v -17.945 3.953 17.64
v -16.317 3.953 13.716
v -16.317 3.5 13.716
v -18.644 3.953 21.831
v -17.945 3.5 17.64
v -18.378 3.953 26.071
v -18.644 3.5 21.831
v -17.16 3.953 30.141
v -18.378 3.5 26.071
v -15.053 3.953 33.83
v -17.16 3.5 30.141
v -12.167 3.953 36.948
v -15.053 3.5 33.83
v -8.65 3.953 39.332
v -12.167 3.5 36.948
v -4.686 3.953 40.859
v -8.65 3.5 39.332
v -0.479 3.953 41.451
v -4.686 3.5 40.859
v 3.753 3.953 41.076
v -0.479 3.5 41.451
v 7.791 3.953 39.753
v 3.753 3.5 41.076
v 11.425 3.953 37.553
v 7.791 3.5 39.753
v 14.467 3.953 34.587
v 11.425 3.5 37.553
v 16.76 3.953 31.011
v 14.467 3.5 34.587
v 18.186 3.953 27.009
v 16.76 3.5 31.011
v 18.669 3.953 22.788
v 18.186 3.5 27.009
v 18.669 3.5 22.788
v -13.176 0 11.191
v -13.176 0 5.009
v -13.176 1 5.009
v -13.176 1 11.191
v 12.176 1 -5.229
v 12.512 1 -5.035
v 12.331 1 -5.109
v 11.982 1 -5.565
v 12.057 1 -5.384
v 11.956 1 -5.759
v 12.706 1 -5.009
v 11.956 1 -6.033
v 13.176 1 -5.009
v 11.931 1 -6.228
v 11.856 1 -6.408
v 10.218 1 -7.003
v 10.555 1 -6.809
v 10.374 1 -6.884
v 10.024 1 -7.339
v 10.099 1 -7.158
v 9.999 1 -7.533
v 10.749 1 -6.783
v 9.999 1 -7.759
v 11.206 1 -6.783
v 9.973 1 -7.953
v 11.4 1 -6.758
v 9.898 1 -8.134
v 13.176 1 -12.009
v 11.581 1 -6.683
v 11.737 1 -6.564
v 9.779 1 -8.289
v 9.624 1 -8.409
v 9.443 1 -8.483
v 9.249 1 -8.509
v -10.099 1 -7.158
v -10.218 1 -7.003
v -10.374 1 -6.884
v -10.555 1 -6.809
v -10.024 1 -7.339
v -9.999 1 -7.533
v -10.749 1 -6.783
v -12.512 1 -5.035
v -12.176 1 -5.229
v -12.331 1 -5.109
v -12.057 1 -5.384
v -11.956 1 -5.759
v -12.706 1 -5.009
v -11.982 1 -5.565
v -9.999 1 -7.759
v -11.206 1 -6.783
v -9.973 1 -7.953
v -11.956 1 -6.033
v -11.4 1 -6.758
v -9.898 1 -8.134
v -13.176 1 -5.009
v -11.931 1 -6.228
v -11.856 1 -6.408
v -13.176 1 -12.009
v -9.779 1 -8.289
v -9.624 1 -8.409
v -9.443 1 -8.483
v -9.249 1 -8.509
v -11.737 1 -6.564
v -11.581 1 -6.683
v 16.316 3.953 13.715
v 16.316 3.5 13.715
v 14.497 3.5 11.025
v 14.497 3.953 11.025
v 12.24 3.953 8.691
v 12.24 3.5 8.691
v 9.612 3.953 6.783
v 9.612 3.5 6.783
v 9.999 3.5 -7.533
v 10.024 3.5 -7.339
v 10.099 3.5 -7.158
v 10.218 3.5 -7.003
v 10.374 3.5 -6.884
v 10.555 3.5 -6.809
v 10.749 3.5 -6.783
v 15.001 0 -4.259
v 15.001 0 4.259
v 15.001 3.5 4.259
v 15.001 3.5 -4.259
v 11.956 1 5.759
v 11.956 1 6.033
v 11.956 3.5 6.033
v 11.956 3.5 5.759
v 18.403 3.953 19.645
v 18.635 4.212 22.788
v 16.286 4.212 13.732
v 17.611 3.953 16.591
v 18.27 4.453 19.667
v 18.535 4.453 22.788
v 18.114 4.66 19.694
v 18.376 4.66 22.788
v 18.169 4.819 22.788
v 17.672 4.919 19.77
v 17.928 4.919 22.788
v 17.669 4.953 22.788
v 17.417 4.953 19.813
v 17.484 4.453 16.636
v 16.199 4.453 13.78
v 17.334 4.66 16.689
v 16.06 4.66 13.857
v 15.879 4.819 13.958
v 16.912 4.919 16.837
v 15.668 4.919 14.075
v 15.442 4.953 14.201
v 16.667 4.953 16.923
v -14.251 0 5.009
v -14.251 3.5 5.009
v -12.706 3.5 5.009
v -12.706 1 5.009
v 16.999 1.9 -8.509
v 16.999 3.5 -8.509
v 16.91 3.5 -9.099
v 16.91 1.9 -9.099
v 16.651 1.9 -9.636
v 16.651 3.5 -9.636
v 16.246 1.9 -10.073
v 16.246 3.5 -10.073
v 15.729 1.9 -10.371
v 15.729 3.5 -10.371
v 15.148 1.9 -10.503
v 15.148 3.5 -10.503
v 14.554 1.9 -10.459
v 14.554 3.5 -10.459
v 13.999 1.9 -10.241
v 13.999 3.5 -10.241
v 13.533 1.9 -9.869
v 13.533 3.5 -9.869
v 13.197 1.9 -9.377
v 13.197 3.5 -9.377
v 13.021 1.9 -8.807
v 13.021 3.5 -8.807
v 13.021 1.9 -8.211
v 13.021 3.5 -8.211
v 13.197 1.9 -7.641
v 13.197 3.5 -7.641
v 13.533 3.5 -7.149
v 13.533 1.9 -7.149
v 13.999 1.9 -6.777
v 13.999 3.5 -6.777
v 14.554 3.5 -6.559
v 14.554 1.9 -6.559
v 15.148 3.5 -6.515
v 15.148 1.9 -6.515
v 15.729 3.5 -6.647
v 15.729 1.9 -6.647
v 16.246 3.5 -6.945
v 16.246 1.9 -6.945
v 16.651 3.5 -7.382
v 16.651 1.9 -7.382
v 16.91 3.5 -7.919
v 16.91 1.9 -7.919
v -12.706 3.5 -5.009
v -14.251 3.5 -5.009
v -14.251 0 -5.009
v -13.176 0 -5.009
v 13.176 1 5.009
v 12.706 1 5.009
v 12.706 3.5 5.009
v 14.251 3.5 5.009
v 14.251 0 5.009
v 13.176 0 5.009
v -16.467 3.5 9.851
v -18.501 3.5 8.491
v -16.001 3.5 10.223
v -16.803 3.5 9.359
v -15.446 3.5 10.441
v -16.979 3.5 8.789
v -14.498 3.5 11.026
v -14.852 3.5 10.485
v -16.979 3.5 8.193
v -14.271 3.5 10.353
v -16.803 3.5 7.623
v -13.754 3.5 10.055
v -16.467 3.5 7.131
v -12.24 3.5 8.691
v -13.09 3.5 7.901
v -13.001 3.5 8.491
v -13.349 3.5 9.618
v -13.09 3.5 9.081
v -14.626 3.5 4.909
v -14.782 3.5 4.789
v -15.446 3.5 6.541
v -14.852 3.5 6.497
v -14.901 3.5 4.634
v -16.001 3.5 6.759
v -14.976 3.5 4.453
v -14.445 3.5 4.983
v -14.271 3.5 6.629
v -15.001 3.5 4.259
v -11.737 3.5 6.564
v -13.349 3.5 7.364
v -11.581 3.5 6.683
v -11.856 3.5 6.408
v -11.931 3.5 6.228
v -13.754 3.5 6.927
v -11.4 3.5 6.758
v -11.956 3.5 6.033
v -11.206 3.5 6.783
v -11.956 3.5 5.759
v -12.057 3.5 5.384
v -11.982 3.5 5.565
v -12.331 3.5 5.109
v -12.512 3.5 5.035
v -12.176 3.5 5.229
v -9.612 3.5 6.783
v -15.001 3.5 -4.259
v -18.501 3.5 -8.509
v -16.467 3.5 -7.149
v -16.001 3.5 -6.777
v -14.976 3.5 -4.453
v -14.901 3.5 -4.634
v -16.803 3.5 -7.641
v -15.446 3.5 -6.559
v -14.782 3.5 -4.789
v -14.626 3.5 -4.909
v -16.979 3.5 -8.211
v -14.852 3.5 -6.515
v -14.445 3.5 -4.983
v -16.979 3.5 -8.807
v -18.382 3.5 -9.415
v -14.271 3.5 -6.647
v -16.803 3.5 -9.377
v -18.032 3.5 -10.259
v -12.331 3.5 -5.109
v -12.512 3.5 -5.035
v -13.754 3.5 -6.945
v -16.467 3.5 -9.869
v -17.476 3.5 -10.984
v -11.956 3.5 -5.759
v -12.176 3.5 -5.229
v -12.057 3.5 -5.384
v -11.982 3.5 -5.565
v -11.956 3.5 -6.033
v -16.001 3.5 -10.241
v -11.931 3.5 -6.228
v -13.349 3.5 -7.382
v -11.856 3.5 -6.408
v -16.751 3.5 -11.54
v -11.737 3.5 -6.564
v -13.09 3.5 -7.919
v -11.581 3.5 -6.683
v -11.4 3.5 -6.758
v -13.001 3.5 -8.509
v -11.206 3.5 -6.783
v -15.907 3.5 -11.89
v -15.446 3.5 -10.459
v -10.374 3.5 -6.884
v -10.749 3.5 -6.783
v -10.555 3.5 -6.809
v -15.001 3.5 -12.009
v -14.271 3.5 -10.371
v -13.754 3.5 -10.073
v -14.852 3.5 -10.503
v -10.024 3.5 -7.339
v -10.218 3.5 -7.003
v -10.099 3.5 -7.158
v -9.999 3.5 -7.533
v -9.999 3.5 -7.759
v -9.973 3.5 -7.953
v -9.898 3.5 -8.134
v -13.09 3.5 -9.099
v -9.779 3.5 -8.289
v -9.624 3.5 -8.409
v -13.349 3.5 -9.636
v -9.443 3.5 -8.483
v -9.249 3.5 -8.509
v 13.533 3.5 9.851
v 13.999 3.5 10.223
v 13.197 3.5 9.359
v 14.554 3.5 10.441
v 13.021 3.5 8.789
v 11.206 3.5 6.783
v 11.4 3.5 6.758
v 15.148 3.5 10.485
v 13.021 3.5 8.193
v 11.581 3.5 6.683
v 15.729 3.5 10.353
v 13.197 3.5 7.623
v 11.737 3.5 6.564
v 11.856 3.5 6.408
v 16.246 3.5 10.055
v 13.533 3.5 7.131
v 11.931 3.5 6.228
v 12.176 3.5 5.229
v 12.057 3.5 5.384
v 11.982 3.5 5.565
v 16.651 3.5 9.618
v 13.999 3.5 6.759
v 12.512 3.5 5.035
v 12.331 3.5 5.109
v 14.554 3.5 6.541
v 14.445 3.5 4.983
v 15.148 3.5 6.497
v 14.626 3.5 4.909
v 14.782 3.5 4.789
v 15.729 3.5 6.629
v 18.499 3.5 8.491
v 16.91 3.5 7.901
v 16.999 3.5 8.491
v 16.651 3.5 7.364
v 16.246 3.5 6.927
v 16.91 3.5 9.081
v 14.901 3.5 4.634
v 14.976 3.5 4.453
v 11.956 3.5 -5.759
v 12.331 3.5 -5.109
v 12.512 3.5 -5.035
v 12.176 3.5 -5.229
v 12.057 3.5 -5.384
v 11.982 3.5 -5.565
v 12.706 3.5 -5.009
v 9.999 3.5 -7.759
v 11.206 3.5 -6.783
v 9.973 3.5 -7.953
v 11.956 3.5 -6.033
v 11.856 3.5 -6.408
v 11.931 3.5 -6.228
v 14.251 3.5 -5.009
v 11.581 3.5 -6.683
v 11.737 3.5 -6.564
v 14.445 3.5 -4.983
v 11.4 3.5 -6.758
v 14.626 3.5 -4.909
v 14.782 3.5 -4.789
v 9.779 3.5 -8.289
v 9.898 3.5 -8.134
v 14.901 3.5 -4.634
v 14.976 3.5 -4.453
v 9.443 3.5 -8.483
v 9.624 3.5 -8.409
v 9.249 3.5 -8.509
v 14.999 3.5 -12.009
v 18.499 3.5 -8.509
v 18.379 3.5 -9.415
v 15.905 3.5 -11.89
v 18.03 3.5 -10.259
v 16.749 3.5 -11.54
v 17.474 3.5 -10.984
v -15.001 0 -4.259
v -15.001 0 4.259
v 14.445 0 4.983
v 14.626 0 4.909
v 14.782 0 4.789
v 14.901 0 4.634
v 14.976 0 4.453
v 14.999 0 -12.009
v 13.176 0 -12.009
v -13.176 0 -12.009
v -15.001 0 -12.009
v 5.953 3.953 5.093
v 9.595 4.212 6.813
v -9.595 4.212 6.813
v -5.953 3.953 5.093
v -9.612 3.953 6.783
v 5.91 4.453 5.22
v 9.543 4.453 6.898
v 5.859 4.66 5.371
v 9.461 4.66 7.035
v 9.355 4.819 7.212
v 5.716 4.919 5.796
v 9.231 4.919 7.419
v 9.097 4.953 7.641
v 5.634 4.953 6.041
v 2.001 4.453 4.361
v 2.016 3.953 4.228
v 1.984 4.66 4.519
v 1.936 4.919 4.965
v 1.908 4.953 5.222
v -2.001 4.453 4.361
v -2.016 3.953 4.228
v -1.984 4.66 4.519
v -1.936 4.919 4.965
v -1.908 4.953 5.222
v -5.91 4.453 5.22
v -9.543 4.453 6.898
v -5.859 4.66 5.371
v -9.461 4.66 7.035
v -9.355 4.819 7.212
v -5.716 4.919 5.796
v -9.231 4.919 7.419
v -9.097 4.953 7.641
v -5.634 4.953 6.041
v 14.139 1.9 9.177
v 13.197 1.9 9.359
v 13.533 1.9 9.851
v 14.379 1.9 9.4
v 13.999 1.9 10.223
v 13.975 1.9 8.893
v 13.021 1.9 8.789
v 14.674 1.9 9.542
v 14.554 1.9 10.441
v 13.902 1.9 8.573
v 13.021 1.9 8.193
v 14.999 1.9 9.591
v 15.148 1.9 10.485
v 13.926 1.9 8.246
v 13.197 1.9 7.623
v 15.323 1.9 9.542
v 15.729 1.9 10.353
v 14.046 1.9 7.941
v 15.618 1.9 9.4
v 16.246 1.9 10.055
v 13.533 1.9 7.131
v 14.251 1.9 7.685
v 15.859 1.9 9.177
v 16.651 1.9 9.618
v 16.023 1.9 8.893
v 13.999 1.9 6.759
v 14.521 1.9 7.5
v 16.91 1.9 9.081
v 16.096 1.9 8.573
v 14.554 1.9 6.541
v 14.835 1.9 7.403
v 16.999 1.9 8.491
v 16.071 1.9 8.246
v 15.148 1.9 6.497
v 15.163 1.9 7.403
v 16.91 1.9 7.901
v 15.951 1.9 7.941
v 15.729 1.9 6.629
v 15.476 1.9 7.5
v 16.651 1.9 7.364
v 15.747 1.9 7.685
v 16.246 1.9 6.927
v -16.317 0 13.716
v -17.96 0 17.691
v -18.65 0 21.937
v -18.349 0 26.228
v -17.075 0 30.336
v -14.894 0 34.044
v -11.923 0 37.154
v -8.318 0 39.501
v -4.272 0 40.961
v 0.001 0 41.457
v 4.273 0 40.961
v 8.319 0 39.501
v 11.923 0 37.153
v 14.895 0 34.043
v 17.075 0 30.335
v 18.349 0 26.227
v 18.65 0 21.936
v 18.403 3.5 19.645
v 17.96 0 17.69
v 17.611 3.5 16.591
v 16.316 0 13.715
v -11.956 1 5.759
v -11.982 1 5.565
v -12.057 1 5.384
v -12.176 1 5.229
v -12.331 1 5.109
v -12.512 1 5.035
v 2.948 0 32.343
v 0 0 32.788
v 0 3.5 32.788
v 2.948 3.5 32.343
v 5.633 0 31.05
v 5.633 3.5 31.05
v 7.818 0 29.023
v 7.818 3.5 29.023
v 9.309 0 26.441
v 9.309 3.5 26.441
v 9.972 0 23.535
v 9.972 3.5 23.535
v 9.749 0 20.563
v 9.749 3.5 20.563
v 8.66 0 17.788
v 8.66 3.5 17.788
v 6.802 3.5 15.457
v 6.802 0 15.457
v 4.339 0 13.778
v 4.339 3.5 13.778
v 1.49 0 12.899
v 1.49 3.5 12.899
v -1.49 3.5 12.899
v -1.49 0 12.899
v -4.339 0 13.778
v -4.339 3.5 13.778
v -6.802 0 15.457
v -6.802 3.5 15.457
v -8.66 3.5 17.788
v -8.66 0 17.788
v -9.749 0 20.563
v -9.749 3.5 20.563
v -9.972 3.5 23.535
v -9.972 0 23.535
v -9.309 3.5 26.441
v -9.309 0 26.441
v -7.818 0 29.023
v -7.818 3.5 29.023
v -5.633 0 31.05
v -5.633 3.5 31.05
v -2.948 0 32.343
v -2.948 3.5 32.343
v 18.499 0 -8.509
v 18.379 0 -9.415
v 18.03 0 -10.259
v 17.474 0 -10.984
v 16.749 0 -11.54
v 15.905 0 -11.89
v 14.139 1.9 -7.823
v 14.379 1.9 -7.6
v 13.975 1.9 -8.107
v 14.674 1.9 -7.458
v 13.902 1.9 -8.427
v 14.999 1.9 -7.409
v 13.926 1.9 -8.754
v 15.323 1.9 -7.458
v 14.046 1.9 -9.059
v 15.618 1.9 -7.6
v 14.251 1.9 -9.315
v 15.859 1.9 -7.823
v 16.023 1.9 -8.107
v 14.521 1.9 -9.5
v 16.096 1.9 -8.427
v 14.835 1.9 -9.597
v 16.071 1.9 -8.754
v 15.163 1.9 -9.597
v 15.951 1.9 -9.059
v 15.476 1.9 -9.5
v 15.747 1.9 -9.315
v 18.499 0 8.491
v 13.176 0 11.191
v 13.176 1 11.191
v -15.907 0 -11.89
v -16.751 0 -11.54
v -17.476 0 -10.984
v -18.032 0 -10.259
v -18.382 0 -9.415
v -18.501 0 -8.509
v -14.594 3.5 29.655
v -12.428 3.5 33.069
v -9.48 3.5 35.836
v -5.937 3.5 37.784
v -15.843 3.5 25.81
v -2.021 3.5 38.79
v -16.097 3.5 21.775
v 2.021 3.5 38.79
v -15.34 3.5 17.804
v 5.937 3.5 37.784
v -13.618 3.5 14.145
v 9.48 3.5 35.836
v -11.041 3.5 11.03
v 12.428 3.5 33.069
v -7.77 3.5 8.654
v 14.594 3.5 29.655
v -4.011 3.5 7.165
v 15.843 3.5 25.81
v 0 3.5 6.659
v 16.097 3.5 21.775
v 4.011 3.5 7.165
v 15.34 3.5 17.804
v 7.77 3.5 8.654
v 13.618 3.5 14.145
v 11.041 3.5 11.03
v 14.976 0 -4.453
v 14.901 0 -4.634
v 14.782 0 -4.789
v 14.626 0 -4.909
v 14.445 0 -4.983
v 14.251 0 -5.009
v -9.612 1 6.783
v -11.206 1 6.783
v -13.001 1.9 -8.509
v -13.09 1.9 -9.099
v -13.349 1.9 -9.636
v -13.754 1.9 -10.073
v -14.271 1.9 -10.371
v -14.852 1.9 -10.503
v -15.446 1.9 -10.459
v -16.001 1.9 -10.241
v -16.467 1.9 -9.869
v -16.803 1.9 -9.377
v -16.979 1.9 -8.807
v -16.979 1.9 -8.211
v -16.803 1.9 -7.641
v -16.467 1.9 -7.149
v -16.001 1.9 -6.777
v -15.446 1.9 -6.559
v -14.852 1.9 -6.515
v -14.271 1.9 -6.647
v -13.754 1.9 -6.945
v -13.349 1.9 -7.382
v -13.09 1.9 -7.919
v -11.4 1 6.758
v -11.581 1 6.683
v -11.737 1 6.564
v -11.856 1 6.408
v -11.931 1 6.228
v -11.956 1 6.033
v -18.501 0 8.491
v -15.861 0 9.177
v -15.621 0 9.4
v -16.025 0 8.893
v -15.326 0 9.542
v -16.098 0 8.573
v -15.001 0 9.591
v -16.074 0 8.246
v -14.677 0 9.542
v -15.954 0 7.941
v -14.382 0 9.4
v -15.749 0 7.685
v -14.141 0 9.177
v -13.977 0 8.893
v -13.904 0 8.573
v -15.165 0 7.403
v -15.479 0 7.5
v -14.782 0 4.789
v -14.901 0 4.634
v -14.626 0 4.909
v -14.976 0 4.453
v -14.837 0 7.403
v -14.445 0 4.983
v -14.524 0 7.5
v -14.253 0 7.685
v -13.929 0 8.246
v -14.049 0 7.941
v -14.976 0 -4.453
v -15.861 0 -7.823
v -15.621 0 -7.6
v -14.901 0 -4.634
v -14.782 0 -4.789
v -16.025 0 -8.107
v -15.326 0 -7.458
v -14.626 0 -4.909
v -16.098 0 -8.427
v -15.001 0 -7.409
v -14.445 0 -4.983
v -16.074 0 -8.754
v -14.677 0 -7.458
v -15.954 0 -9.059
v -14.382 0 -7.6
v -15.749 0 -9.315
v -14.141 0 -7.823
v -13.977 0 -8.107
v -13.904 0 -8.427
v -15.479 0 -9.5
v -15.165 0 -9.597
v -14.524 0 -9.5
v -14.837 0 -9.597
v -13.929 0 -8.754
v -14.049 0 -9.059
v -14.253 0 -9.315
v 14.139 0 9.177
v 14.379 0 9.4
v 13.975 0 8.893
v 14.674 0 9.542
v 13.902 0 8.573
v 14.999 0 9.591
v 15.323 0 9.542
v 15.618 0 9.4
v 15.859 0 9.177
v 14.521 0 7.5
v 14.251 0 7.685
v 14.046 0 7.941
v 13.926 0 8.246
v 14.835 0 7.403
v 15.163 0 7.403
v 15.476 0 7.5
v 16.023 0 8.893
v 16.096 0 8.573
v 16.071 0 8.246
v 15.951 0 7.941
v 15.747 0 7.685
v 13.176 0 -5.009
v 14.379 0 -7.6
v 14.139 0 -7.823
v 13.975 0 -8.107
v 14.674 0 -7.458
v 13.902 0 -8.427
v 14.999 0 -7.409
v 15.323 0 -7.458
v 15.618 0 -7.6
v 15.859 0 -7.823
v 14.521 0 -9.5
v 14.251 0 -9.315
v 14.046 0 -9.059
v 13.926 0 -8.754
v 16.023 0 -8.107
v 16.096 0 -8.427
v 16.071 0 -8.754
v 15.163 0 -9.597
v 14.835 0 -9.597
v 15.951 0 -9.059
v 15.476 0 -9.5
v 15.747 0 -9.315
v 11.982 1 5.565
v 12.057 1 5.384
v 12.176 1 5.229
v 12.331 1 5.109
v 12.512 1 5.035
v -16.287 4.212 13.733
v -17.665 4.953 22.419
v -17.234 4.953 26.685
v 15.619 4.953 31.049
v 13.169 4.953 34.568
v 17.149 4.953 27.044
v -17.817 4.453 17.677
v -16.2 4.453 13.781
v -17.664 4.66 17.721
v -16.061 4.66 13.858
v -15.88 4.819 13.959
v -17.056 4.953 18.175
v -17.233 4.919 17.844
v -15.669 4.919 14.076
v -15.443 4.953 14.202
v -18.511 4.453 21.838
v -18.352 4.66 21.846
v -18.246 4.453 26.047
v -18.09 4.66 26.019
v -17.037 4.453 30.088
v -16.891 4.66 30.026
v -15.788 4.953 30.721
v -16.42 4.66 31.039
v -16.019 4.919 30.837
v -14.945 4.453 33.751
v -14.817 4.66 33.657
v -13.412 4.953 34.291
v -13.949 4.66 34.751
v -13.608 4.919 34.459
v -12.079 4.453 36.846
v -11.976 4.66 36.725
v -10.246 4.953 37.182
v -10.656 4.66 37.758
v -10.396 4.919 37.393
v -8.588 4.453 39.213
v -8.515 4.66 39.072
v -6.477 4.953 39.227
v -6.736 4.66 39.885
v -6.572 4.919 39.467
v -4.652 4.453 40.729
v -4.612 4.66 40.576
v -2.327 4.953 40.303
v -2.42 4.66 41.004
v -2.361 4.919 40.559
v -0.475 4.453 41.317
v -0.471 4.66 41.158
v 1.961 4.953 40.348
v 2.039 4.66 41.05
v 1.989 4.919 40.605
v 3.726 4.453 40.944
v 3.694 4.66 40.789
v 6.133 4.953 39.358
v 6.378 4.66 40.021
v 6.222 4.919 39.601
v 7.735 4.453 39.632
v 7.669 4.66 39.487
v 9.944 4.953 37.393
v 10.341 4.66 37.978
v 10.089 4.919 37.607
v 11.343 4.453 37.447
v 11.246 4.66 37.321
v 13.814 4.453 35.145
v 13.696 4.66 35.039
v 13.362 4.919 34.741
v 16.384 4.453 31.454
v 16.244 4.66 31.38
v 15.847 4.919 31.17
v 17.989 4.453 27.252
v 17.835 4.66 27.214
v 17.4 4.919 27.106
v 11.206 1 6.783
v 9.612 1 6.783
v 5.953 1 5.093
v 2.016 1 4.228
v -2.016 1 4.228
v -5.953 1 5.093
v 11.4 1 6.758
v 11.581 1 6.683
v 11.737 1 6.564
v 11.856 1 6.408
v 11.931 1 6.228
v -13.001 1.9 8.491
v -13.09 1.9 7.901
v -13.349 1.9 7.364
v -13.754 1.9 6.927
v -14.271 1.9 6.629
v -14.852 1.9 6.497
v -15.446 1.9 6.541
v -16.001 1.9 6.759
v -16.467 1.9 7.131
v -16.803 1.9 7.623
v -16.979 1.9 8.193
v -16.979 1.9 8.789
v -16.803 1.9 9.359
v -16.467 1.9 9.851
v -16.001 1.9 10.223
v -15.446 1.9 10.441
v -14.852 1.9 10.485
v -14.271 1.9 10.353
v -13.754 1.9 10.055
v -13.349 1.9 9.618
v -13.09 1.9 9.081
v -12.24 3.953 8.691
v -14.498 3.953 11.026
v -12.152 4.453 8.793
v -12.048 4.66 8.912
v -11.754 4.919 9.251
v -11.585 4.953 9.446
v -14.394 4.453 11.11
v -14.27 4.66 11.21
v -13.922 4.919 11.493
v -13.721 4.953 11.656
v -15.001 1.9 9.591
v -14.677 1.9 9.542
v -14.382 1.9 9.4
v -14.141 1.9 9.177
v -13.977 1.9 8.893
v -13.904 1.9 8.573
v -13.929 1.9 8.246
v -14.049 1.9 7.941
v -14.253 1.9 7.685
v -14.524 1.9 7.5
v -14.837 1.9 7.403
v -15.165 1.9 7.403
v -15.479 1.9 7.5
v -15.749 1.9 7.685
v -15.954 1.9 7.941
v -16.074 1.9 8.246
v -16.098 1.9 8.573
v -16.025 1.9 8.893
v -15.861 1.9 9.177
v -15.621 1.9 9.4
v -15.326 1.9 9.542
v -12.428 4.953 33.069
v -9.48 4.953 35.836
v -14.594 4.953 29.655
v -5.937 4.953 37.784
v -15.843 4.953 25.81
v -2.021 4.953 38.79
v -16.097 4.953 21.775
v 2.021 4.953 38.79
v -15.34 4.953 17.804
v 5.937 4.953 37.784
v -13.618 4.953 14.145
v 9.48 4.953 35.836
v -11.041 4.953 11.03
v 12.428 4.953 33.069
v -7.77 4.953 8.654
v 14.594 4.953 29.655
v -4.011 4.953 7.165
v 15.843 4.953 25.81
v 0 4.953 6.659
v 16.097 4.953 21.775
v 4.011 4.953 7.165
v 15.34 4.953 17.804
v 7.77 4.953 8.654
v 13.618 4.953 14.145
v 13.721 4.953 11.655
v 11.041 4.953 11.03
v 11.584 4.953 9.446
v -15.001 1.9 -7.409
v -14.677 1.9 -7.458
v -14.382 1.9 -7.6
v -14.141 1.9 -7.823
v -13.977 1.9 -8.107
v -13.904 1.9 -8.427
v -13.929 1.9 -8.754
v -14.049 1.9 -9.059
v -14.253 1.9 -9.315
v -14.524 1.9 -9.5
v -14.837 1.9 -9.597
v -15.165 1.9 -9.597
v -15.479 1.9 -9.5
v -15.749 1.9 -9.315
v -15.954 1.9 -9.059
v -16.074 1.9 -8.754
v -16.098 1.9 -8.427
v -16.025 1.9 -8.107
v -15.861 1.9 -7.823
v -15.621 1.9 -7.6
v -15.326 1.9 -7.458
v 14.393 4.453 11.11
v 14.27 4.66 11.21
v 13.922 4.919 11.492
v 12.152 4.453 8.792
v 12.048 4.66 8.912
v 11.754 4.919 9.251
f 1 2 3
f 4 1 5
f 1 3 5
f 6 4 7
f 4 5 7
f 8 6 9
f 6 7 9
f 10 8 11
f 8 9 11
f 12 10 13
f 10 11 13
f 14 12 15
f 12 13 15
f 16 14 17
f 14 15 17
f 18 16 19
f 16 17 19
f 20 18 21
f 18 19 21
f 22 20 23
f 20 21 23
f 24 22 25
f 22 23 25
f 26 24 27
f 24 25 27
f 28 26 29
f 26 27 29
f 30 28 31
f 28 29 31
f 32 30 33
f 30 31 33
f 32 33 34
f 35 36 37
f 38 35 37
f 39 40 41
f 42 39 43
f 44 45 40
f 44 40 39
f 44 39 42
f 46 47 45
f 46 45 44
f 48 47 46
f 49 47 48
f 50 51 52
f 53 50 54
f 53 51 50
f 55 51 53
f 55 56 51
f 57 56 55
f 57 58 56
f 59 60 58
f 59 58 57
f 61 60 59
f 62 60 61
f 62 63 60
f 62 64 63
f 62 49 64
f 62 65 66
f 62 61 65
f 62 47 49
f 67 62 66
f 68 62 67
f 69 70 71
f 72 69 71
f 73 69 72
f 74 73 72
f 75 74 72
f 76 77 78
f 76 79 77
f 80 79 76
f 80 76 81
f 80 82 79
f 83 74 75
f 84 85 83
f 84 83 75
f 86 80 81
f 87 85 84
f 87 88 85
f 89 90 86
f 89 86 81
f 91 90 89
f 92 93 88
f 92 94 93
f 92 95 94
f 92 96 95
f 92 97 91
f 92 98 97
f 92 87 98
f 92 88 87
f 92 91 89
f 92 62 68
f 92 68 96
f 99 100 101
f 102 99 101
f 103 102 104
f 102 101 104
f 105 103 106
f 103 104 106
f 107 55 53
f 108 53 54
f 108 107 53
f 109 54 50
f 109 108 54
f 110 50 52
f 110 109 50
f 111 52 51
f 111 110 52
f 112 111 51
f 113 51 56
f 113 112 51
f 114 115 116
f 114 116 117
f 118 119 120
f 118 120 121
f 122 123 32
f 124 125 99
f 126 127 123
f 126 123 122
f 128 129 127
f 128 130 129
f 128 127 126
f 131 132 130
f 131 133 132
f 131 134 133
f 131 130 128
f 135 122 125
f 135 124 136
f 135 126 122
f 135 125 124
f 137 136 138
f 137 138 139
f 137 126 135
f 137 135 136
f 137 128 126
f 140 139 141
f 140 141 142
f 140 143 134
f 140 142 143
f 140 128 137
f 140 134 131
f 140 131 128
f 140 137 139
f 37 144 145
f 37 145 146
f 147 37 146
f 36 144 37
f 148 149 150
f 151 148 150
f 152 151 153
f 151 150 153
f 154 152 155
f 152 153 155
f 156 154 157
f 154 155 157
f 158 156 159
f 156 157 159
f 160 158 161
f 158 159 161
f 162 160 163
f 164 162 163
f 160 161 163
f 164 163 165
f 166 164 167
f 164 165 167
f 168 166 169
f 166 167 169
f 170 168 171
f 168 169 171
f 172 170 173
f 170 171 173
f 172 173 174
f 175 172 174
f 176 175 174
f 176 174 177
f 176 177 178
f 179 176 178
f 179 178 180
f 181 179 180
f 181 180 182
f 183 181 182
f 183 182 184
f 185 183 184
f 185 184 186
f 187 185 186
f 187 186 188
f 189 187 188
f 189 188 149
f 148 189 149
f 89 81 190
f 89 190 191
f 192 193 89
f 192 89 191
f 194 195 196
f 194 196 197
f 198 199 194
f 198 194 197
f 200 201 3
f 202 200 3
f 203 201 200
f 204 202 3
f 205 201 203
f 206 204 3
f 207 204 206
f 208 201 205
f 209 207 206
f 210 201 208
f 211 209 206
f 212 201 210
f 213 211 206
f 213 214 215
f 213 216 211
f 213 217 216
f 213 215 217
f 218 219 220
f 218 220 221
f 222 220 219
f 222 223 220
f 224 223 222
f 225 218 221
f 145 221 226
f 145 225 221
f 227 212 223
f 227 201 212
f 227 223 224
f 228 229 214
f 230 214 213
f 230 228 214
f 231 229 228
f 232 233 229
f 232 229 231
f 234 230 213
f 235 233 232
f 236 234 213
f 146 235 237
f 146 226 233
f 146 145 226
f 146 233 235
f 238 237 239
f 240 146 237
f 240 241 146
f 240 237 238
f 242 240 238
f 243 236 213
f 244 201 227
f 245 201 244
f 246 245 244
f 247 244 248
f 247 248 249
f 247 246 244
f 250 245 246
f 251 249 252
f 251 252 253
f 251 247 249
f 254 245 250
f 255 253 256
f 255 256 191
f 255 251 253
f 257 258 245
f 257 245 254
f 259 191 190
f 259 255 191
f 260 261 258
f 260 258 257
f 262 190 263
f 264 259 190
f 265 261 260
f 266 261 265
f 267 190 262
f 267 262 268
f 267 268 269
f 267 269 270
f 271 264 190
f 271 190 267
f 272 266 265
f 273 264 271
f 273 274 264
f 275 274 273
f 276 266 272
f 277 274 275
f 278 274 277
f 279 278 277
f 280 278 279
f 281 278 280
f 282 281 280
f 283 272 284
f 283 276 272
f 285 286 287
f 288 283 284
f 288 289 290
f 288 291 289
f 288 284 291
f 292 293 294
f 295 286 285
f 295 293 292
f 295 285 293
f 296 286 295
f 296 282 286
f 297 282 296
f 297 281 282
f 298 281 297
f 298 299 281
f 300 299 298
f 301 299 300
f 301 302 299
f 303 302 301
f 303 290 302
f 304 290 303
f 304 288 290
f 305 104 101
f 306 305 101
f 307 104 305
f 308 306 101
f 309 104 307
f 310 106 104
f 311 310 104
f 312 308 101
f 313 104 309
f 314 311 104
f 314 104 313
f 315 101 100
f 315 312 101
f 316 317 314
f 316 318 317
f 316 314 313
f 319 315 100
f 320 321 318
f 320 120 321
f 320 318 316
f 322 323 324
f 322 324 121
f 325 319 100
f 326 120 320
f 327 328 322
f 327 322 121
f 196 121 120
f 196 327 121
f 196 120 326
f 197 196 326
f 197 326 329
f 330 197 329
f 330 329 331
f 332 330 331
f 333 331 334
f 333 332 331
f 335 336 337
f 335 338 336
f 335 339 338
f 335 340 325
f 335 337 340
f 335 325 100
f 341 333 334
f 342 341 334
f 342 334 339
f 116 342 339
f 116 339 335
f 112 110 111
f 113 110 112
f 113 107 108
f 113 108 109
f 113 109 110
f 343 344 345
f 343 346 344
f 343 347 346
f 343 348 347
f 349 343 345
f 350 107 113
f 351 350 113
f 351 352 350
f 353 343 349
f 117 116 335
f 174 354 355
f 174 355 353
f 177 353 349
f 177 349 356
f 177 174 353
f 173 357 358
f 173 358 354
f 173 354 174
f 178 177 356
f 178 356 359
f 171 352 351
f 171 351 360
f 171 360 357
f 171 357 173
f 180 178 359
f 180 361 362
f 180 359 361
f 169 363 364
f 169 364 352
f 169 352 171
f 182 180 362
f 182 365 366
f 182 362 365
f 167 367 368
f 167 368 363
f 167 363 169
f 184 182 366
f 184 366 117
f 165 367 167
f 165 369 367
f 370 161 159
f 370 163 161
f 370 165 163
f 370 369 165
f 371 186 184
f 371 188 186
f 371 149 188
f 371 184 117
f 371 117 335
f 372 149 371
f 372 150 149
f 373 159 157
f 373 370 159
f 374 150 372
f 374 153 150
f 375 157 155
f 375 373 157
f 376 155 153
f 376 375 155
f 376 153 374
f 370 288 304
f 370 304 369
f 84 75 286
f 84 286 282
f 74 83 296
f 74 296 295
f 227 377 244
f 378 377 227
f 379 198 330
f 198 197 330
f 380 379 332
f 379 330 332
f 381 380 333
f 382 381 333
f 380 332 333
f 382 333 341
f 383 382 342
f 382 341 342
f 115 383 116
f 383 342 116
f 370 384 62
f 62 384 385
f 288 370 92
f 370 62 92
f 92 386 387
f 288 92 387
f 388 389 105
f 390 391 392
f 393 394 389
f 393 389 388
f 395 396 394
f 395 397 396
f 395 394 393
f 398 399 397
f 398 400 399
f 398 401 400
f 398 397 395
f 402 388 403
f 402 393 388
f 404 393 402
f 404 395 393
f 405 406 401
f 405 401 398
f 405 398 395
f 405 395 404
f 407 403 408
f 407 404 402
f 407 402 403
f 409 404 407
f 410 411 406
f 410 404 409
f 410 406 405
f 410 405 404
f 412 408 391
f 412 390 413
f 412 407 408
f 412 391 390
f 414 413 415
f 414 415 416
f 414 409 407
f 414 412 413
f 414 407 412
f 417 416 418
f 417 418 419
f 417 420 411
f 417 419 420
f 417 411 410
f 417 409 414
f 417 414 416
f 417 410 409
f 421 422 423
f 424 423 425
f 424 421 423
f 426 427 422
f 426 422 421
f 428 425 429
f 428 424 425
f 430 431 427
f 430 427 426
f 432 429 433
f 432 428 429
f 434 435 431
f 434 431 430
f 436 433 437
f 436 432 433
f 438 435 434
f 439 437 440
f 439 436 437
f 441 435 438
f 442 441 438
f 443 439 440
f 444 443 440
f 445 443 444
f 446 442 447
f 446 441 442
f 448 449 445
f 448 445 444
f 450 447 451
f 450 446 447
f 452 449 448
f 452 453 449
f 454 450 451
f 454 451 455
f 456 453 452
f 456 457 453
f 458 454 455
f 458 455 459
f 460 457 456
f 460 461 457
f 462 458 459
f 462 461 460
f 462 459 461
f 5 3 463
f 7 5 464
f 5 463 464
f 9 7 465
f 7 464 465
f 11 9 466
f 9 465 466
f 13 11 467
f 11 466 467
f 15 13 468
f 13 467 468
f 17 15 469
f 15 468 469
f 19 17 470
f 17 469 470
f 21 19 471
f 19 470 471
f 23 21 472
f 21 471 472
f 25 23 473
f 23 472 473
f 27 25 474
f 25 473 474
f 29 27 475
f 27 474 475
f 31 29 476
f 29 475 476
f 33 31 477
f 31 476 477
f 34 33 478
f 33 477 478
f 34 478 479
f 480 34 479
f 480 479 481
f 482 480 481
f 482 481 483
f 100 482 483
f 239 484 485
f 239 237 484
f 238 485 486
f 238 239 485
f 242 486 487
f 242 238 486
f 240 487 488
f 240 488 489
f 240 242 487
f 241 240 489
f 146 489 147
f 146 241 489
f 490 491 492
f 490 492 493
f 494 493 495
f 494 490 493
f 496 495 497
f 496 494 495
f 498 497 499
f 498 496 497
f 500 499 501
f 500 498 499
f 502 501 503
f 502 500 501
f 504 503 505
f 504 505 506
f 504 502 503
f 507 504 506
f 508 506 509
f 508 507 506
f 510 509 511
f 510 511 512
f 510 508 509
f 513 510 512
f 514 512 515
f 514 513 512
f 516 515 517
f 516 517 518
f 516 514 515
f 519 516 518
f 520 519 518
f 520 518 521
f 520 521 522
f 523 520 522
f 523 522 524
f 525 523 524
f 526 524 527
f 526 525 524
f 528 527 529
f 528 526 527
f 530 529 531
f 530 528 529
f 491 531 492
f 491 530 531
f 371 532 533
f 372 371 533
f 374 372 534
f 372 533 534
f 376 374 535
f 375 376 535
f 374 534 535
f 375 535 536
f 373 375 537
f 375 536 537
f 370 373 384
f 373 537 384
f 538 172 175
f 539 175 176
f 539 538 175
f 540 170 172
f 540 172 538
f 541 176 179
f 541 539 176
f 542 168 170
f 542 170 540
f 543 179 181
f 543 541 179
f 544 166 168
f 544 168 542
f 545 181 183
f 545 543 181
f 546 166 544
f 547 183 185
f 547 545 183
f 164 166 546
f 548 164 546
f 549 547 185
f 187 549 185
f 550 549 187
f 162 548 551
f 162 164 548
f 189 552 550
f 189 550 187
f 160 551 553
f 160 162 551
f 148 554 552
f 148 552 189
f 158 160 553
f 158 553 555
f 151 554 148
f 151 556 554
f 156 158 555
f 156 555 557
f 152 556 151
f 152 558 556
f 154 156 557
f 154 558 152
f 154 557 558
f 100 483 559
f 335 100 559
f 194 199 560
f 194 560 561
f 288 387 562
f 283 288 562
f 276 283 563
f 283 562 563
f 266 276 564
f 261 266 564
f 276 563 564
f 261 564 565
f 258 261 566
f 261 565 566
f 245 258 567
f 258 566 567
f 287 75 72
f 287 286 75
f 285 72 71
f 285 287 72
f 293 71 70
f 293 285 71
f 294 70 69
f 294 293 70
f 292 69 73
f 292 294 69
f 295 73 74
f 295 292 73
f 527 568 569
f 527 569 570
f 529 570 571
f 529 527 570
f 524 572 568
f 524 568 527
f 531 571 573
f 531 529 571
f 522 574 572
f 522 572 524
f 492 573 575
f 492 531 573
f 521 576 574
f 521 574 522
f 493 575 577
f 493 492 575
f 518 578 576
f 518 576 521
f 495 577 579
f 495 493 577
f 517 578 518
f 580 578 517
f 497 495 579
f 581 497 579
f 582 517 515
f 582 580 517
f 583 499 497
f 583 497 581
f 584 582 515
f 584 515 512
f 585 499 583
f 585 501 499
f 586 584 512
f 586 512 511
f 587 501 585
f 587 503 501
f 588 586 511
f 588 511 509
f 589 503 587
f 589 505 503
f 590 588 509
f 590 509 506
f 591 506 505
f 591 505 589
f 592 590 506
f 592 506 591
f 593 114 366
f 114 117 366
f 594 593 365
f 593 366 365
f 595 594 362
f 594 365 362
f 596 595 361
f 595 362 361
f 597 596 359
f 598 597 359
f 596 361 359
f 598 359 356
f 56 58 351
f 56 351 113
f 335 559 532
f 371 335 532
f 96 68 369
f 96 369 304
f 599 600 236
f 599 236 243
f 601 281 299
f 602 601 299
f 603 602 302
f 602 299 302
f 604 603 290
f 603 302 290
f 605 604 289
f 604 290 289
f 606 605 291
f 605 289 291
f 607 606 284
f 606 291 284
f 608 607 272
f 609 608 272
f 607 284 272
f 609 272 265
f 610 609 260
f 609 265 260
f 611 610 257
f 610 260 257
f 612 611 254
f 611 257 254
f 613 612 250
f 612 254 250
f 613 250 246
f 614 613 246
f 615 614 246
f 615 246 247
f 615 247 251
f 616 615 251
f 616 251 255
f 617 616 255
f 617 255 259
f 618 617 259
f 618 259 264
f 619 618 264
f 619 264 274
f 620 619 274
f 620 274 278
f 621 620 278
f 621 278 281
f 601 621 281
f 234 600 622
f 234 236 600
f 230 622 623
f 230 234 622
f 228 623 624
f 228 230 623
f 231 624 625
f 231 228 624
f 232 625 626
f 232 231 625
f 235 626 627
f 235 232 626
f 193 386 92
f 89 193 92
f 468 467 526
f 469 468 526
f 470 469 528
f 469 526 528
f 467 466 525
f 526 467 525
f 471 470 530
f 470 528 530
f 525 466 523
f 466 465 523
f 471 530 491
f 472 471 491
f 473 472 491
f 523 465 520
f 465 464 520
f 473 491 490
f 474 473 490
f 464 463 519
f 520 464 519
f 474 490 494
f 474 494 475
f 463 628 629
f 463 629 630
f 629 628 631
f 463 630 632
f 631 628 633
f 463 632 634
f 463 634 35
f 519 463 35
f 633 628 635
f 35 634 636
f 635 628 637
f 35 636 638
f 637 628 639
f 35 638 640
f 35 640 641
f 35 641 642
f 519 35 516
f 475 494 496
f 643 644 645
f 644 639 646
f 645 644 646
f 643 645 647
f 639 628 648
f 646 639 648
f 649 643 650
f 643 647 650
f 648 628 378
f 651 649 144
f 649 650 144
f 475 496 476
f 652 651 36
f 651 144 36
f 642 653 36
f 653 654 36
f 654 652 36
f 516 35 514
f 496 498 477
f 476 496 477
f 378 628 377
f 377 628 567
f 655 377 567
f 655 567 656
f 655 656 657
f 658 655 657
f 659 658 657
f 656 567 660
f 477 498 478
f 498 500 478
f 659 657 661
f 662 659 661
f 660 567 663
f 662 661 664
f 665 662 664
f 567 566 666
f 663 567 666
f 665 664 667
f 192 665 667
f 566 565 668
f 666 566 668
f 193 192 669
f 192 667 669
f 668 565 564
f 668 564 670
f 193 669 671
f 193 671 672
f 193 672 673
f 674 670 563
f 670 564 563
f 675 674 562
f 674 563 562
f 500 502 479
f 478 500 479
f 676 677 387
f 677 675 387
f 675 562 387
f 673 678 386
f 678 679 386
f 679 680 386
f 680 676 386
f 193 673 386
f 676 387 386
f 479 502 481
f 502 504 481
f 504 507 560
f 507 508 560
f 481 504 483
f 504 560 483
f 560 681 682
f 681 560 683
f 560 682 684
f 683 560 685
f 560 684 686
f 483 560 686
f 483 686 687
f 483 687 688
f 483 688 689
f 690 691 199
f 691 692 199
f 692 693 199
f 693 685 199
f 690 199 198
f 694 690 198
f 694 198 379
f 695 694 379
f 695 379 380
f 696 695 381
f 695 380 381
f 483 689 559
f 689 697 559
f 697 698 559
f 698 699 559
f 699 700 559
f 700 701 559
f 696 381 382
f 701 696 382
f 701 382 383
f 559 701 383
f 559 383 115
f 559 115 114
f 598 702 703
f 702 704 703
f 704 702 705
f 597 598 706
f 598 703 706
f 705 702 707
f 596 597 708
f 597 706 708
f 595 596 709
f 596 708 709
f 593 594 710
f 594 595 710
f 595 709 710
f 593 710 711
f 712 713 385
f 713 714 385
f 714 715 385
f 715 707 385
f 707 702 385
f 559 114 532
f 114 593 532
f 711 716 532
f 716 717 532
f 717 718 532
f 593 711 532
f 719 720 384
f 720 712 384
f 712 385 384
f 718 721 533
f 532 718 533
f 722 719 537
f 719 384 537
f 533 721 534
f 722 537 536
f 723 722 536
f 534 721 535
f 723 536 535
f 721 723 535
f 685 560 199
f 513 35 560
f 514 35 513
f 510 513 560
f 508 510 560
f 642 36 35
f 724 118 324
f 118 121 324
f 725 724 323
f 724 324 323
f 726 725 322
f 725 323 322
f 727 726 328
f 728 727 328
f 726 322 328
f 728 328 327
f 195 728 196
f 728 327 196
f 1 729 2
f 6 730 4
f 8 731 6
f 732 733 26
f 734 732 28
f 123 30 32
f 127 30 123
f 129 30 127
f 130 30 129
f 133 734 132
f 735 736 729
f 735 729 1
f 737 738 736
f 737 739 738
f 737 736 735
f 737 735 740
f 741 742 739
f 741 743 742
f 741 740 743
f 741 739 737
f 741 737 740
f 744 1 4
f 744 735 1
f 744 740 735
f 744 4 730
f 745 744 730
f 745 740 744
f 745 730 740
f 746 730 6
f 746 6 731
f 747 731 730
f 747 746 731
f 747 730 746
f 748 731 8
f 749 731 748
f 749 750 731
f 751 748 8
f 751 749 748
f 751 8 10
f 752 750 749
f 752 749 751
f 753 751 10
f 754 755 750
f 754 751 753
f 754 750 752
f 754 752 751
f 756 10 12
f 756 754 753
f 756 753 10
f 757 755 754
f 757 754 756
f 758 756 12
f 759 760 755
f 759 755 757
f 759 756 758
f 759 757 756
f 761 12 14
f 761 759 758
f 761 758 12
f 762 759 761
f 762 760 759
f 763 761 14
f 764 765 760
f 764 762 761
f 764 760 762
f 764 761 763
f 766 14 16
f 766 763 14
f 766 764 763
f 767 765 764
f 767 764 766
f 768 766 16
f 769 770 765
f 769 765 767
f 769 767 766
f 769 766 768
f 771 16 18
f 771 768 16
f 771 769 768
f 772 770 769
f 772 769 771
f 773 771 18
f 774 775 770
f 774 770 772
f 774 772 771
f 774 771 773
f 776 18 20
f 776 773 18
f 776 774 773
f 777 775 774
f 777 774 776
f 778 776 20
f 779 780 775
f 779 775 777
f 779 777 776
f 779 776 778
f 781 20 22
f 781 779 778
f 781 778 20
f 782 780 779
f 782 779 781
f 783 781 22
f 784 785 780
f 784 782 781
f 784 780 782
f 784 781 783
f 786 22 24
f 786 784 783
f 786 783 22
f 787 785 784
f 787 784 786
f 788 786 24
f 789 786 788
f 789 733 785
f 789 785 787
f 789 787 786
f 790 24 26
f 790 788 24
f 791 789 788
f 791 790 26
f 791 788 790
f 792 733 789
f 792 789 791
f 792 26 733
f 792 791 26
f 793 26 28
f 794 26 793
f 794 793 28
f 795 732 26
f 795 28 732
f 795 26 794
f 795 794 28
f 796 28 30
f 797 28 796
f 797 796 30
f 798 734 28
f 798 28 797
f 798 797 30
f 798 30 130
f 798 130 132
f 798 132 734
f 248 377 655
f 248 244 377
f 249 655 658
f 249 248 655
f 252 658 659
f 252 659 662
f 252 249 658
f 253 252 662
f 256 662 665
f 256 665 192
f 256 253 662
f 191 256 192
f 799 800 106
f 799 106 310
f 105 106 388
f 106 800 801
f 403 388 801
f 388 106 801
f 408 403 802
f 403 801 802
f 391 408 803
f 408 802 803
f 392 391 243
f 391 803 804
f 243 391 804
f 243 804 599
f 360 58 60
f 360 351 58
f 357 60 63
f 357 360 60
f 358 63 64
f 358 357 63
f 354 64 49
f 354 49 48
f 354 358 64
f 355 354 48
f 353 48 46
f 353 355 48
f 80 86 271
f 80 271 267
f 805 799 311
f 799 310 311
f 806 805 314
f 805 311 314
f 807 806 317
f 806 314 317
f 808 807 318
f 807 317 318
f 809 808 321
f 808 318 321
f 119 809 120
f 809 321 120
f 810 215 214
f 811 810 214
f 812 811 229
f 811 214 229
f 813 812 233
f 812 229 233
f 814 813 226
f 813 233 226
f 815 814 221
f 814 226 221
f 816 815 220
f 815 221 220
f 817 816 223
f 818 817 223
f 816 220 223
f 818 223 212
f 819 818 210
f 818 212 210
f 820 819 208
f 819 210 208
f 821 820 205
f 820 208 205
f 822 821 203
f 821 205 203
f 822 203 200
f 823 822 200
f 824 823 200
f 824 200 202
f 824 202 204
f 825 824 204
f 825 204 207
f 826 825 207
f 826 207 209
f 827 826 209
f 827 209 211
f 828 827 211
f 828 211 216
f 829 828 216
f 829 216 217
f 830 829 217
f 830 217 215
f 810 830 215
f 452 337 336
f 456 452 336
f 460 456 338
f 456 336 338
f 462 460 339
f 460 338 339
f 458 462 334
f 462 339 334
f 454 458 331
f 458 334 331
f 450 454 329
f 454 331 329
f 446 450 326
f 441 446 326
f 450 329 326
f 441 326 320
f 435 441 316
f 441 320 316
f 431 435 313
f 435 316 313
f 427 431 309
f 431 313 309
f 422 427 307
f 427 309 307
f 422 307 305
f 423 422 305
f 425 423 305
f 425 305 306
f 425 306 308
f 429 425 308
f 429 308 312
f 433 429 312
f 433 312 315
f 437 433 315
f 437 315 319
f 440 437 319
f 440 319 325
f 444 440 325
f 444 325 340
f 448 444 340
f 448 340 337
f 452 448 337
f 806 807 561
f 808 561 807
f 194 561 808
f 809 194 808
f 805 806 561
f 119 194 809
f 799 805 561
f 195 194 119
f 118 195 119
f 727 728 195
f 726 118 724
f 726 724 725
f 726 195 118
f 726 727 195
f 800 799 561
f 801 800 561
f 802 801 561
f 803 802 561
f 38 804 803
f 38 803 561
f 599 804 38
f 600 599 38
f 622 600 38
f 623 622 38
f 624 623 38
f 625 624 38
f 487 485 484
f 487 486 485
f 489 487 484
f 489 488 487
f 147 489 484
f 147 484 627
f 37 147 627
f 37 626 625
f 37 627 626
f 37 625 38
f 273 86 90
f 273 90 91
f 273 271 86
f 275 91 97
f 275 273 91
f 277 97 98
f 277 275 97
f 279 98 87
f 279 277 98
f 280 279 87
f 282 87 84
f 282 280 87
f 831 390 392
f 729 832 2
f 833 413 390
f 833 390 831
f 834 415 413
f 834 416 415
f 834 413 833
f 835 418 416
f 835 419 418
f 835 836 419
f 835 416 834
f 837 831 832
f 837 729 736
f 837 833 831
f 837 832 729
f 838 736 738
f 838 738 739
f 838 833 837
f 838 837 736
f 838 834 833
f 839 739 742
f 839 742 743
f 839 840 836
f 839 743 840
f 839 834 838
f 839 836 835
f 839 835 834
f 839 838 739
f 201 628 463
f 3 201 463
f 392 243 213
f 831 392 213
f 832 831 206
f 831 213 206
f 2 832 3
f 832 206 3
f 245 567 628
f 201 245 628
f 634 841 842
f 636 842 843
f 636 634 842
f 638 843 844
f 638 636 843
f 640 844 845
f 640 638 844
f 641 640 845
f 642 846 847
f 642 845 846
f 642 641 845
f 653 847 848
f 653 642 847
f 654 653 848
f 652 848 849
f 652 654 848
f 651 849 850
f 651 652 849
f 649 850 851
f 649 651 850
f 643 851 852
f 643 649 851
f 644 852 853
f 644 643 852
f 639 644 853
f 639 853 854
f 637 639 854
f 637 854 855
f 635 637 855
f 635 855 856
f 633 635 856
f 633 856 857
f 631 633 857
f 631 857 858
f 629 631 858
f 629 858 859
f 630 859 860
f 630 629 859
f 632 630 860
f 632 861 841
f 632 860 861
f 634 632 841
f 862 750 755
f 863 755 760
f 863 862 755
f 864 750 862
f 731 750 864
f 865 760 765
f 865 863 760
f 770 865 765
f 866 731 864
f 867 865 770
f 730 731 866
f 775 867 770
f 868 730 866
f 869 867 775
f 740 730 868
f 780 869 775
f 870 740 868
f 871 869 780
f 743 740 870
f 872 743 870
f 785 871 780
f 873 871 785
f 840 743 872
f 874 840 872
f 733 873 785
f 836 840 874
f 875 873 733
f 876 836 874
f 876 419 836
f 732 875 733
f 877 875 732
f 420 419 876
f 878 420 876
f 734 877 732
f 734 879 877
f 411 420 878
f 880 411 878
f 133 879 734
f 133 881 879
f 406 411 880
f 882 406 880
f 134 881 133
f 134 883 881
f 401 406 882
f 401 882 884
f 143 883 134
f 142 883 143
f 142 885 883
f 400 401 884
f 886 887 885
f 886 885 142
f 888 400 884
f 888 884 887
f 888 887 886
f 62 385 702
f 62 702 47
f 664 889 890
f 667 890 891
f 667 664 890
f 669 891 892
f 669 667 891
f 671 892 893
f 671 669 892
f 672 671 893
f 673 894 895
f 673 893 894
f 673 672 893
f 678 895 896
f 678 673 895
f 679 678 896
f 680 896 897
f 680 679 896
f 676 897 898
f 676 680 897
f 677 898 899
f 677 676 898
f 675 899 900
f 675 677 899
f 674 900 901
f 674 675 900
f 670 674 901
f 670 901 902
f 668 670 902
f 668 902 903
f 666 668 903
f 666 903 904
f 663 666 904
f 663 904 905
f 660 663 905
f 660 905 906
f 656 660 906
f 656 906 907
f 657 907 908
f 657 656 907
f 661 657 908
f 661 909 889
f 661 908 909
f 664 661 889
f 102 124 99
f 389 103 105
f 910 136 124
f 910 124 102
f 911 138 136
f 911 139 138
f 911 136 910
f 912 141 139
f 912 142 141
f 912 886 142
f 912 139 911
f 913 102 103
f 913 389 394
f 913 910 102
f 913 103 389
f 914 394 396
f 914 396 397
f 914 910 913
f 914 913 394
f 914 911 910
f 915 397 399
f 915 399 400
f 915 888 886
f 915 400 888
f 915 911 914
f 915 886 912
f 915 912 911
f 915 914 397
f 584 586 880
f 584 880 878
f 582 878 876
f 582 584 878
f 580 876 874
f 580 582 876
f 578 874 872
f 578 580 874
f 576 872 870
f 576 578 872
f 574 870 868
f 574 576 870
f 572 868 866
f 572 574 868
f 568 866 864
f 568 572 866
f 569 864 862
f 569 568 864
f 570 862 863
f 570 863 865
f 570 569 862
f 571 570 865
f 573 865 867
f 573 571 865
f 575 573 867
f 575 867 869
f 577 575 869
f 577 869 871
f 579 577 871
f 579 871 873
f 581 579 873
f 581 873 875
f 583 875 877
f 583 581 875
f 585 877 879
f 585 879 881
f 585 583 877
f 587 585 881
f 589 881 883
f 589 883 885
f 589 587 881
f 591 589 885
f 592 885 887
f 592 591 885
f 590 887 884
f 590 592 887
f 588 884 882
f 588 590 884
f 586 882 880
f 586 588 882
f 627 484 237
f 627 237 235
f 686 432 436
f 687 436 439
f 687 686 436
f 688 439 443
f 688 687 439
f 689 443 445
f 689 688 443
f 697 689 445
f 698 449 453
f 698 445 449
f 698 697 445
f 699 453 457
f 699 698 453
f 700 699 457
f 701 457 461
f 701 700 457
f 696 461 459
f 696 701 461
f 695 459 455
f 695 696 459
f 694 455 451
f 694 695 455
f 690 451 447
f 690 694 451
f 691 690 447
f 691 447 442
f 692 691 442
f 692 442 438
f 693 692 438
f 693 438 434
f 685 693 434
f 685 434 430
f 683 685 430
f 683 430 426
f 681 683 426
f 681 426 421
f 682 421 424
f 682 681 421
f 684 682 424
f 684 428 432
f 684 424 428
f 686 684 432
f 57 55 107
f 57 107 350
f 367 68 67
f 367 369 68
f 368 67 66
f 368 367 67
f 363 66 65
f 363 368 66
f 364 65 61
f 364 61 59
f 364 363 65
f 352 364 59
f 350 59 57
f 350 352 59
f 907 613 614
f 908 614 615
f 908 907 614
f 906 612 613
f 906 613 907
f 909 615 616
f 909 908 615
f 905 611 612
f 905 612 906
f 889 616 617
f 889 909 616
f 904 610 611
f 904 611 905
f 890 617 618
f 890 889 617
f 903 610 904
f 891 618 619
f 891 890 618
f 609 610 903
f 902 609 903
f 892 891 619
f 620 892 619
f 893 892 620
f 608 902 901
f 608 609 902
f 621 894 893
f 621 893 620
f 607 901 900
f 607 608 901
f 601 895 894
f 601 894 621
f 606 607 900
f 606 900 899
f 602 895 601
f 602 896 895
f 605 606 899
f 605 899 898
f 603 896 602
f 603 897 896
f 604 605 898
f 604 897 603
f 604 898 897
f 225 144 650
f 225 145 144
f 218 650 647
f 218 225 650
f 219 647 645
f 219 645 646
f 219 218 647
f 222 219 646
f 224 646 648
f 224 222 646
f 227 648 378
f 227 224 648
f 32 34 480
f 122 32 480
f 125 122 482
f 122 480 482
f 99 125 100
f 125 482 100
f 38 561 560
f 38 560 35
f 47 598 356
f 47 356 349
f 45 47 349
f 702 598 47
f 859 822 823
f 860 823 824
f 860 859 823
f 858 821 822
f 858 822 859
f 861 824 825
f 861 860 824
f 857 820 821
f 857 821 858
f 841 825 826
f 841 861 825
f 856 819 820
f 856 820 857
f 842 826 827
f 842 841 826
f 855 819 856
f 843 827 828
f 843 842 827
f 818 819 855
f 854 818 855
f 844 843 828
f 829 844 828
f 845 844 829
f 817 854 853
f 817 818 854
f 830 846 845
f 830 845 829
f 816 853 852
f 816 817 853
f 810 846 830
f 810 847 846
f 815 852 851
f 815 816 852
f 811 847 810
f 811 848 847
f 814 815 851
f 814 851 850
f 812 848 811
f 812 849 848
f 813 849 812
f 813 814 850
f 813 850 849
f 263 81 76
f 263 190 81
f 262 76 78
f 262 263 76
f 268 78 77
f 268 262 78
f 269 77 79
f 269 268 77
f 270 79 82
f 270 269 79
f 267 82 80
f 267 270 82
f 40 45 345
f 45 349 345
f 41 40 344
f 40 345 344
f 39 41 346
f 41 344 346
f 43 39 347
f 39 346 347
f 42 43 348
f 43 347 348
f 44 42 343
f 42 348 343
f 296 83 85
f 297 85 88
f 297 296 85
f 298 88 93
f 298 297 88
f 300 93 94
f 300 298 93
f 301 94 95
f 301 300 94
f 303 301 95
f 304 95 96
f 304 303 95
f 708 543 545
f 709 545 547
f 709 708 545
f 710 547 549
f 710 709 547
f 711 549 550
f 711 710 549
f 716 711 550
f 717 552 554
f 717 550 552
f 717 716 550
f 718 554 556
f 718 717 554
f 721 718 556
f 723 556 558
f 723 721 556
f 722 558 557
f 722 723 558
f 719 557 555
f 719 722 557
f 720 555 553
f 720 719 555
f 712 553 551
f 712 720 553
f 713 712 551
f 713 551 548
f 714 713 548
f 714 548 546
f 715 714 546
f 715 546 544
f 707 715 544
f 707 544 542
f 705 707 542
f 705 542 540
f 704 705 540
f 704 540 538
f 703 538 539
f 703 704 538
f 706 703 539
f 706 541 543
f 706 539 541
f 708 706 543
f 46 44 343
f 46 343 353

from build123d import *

# Parameters (mm, degrees)
SKETCH1_R                                        = 10
SKETCH1_R_2                                      = 1.1
BOSS_EXTRUDE1_DEPTH                              = 3.5
BOSS_EXTRUDE2_START                              = -3.5
BOSS_EXTRUDE2_DEPTH                              = 3.5
SKETCH8_R                                        = 16.129
BOSS_EXTRUDE4_DEPTH                              = 1.453
SKETCH9_W                                        = 26.35135
SKETCH9_H                                        = 1
CUT_EXTRUDE1_DEPTH                               = 23.2
CBORE_FOR_M2_HEX_HEAD_MACHINE_SCREW1_D           = 2.1
CBORE_FOR_M2_HEX_HEAD_MACHINE_SCREW1_DEPTH       = 3.5
CBORE_FOR_M2_HEX_HEAD_MACHINE_SCREW1_CBORE_D     = 4
CBORE_FOR_M2_HEX_HEAD_MACHINE_SCREW1_CBORE_DEPTH = 1.6
FILLET1_R                                        = 0.75
FILLET2_R                                        = 1


# Read off the part's stored shape, not the designer's step: Boss-Extrude2
with BuildPart() as part:
    # Sketch1 → Boss-Extrude1 (new body)
    with BuildSketch(Plane(origin=(0, 0, 0), x_dir=(1, 0, 0), z_dir=(0, 1, 0))):
        with BuildLine():
            Line((-18.5013, 8.509), (-18.5013, -8.491))
            Line((-18.5013, -8.491), (-15.0013, -16.862708425))
            ThreePointArc((-15.0013, -16.862708425), (0, -38.916709632), (15.0013, -16.862708425))
            Line((15.0013, -16.862708425), (18.4987, -8.491))
            Line((18.4987, -8.491), (18.4987, 8.509))
            ThreePointArc((18.4987, 8.509), (17.473573734, 10.983873734), (14.9987, 12.009))
            Line((14.9987, 12.009), (-15.0013, 12.009))
            ThreePointArc((-15.0013, 12.009), (-17.476173734, 10.983873734), (-18.5013, 8.509))
        make_face()
        with Locations(Location((0, -22.787709632, 0), (0, 0, 270))):
            Circle(SKETCH1_R, mode=Mode.SUBTRACT)
        with Locations(Location((-15.0013, 8.509, 0), (0, 0, 270))):
            Circle(SKETCH1_R_2, mode=Mode.SUBTRACT)
        with Locations(Location((-15.0013, -8.491, 0), (0, 0, 270))):
            Circle(SKETCH1_R_2, mode=Mode.SUBTRACT)
        with Locations(Location((14.9987, 8.509, 0), (0, 0, 270))):
            Circle(SKETCH1_R_2, mode=Mode.SUBTRACT)
        with Locations(Location((14.9987, -8.491, 0), (0, 0, 270))):
            Circle(SKETCH1_R_2, mode=Mode.SUBTRACT)
        Polygon((-11.95622235, -6.783455998), (11.95622235, -6.783455998), (11.95622235, -5.009), (15.0013, -5.009), (15.0013, 5.009), (11.95622235, 5.009), (11.95622235, 6.783455998), (9.9987, 6.783455998), (9.9987, 8.509), (-9.9987, 8.509), (-9.9987, 6.783455998), (-11.95622235, 6.783455998), (-11.95622235, 5.009), (-15.0013, 5.009), (-15.0013, -5.009), (-11.95622235, -5.009), align=None, mode=Mode.SUBTRACT)
    extrude(amount=BOSS_EXTRUDE1_DEPTH)

    # Boss-Extrude2 outline → Boss-Extrude2 (add)
    with BuildSketch(Plane(origin=(0, 3.5, 0), x_dir=(1, 0, 0), z_dir=(0, 1, 0)).offset(BOSS_EXTRUDE2_START)):
        with BuildLine():
            Line((-15.0013, -16.862708425), (-16.316803416, -13.716133844))
            ThreePointArc((-16.316803416, -13.716133844), (0.000574122, -41.456709624), (16.316245434, -13.71513029))
            Line((16.316245434, -13.71513029), (15.0013, -16.862708425))
            ThreePointArc((15.0013, -16.862708425), (0, -38.916709632), (-15.0013, -16.862708425))
        make_face()
        with BuildLine():
            Line((-9.612253982, -6.783455998), (9.612253982, -6.783455998))
            ThreePointArc((9.612253982, -6.783455998), (0, -4.118709632), (-9.612253982, -6.783455998))
        make_face()
    extrude(amount=BOSS_EXTRUDE2_DEPTH)

    # Sketch8 → Boss-Extrude4 (add)
    with BuildSketch(Plane(origin=(0, 3.5, 0), x_dir=(1, 0, 0), z_dir=(0, 1, 0))):
        with BuildLine():
            ThreePointArc((-16.316803416, -13.716133844), (-4.685784781, -40.859095356), (18.669, -22.787709632))
            ThreePointArc((18.669, -22.787709632), (18.071241615, -18.10136911), (16.316245434, -13.71513029))
            ThreePointArc((16.316245434, -13.71513029), (13.419530454, -9.808966882), (9.612253982, -6.783455998))
            ThreePointArc((9.612253982, -6.783455998), (0, -4.118709632), (-9.612253982, -6.783455998))
            ThreePointArc((-9.612253982, -6.783455998), (-13.419929579, -9.809379575), (-16.316803416, -13.716133844))
        make_face()
        with Locations(Location((0, -22.787709632, 0), (0, 0, 90))):
            Circle(SKETCH8_R, mode=Mode.SUBTRACT)
    extrude(amount=BOSS_EXTRUDE4_DEPTH)

    # Sketch9 → Cut-Extrude1 (cut)
    with BuildSketch(Plane(origin=(0, 0, -12.009), x_dir=(-1, 0, 0), z_dir=(0, 0, -1))):
        with Locations((0, 0.5)):
            Rectangle(SKETCH9_W, SKETCH9_H)
    extrude(amount=-CUT_EXTRUDE1_DEPTH, mode=Mode.SUBTRACT)

    # CBORE for M2 Hex Head Machine Screw1
    with Locations(Plane(origin=(0, 3.5, 0), x_dir=(1, 0, 0), z_dir=(0, 1, 0))):
        with Locations((-15.0013, 8.509), (14.9987, 8.509), (14.9987, -8.491), (-15.0013, -8.491)):
            CounterBoreHole(CBORE_FOR_M2_HEX_HEAD_MACHINE_SCREW1_D / 2, CBORE_FOR_M2_HEX_HEAD_MACHINE_SCREW1_CBORE_D / 2, CBORE_FOR_M2_HEX_HEAD_MACHINE_SCREW1_CBORE_DEPTH, depth=CBORE_FOR_M2_HEX_HEAD_MACHINE_SCREW1_DEPTH)

    # Fillet1
    fillet1_edges = [part.edges().sort_by_distance(p)[0] for p in [
        (9.9987, 2.25, -8.509),
        (-9.9987, 2.25, -8.509),
        (-9.9987, 2.25, -6.783455998),
        (-11.95622235, 2.25, -6.783455998),
        (-11.95622235, 2.25, -5.009),
        (-15.0013, 1.75, -5.009),
        (-15.0013, 1.75, 5.009),
        (-11.95622235, 2.25, 5.009),
        (-11.95622235, 2.25, 6.783455998),
        (11.95622235, 2.25, 6.783455998),
        (11.95622235, 2.25, 5.009),
        (15.0013, 1.75, 5.009),
        (15.0013, 1.75, -5.009),
        (11.95622235, 2.25, -5.009),
        (11.95622235, 2.25, -6.783455998),
        (9.9987, 2.25, -6.783455998),
    ]]
    fillet(fillet1_edges, radius=FILLET1_R)

    # Fillet2
    fillet2_edges = [part.edges().sort_by_distance(p)[0] for p in [
        (-18.669, 4.953, 22.787709632),
    ]]
    fillet(fillet2_edges, radius=FILLET2_R)


solid = part.part
